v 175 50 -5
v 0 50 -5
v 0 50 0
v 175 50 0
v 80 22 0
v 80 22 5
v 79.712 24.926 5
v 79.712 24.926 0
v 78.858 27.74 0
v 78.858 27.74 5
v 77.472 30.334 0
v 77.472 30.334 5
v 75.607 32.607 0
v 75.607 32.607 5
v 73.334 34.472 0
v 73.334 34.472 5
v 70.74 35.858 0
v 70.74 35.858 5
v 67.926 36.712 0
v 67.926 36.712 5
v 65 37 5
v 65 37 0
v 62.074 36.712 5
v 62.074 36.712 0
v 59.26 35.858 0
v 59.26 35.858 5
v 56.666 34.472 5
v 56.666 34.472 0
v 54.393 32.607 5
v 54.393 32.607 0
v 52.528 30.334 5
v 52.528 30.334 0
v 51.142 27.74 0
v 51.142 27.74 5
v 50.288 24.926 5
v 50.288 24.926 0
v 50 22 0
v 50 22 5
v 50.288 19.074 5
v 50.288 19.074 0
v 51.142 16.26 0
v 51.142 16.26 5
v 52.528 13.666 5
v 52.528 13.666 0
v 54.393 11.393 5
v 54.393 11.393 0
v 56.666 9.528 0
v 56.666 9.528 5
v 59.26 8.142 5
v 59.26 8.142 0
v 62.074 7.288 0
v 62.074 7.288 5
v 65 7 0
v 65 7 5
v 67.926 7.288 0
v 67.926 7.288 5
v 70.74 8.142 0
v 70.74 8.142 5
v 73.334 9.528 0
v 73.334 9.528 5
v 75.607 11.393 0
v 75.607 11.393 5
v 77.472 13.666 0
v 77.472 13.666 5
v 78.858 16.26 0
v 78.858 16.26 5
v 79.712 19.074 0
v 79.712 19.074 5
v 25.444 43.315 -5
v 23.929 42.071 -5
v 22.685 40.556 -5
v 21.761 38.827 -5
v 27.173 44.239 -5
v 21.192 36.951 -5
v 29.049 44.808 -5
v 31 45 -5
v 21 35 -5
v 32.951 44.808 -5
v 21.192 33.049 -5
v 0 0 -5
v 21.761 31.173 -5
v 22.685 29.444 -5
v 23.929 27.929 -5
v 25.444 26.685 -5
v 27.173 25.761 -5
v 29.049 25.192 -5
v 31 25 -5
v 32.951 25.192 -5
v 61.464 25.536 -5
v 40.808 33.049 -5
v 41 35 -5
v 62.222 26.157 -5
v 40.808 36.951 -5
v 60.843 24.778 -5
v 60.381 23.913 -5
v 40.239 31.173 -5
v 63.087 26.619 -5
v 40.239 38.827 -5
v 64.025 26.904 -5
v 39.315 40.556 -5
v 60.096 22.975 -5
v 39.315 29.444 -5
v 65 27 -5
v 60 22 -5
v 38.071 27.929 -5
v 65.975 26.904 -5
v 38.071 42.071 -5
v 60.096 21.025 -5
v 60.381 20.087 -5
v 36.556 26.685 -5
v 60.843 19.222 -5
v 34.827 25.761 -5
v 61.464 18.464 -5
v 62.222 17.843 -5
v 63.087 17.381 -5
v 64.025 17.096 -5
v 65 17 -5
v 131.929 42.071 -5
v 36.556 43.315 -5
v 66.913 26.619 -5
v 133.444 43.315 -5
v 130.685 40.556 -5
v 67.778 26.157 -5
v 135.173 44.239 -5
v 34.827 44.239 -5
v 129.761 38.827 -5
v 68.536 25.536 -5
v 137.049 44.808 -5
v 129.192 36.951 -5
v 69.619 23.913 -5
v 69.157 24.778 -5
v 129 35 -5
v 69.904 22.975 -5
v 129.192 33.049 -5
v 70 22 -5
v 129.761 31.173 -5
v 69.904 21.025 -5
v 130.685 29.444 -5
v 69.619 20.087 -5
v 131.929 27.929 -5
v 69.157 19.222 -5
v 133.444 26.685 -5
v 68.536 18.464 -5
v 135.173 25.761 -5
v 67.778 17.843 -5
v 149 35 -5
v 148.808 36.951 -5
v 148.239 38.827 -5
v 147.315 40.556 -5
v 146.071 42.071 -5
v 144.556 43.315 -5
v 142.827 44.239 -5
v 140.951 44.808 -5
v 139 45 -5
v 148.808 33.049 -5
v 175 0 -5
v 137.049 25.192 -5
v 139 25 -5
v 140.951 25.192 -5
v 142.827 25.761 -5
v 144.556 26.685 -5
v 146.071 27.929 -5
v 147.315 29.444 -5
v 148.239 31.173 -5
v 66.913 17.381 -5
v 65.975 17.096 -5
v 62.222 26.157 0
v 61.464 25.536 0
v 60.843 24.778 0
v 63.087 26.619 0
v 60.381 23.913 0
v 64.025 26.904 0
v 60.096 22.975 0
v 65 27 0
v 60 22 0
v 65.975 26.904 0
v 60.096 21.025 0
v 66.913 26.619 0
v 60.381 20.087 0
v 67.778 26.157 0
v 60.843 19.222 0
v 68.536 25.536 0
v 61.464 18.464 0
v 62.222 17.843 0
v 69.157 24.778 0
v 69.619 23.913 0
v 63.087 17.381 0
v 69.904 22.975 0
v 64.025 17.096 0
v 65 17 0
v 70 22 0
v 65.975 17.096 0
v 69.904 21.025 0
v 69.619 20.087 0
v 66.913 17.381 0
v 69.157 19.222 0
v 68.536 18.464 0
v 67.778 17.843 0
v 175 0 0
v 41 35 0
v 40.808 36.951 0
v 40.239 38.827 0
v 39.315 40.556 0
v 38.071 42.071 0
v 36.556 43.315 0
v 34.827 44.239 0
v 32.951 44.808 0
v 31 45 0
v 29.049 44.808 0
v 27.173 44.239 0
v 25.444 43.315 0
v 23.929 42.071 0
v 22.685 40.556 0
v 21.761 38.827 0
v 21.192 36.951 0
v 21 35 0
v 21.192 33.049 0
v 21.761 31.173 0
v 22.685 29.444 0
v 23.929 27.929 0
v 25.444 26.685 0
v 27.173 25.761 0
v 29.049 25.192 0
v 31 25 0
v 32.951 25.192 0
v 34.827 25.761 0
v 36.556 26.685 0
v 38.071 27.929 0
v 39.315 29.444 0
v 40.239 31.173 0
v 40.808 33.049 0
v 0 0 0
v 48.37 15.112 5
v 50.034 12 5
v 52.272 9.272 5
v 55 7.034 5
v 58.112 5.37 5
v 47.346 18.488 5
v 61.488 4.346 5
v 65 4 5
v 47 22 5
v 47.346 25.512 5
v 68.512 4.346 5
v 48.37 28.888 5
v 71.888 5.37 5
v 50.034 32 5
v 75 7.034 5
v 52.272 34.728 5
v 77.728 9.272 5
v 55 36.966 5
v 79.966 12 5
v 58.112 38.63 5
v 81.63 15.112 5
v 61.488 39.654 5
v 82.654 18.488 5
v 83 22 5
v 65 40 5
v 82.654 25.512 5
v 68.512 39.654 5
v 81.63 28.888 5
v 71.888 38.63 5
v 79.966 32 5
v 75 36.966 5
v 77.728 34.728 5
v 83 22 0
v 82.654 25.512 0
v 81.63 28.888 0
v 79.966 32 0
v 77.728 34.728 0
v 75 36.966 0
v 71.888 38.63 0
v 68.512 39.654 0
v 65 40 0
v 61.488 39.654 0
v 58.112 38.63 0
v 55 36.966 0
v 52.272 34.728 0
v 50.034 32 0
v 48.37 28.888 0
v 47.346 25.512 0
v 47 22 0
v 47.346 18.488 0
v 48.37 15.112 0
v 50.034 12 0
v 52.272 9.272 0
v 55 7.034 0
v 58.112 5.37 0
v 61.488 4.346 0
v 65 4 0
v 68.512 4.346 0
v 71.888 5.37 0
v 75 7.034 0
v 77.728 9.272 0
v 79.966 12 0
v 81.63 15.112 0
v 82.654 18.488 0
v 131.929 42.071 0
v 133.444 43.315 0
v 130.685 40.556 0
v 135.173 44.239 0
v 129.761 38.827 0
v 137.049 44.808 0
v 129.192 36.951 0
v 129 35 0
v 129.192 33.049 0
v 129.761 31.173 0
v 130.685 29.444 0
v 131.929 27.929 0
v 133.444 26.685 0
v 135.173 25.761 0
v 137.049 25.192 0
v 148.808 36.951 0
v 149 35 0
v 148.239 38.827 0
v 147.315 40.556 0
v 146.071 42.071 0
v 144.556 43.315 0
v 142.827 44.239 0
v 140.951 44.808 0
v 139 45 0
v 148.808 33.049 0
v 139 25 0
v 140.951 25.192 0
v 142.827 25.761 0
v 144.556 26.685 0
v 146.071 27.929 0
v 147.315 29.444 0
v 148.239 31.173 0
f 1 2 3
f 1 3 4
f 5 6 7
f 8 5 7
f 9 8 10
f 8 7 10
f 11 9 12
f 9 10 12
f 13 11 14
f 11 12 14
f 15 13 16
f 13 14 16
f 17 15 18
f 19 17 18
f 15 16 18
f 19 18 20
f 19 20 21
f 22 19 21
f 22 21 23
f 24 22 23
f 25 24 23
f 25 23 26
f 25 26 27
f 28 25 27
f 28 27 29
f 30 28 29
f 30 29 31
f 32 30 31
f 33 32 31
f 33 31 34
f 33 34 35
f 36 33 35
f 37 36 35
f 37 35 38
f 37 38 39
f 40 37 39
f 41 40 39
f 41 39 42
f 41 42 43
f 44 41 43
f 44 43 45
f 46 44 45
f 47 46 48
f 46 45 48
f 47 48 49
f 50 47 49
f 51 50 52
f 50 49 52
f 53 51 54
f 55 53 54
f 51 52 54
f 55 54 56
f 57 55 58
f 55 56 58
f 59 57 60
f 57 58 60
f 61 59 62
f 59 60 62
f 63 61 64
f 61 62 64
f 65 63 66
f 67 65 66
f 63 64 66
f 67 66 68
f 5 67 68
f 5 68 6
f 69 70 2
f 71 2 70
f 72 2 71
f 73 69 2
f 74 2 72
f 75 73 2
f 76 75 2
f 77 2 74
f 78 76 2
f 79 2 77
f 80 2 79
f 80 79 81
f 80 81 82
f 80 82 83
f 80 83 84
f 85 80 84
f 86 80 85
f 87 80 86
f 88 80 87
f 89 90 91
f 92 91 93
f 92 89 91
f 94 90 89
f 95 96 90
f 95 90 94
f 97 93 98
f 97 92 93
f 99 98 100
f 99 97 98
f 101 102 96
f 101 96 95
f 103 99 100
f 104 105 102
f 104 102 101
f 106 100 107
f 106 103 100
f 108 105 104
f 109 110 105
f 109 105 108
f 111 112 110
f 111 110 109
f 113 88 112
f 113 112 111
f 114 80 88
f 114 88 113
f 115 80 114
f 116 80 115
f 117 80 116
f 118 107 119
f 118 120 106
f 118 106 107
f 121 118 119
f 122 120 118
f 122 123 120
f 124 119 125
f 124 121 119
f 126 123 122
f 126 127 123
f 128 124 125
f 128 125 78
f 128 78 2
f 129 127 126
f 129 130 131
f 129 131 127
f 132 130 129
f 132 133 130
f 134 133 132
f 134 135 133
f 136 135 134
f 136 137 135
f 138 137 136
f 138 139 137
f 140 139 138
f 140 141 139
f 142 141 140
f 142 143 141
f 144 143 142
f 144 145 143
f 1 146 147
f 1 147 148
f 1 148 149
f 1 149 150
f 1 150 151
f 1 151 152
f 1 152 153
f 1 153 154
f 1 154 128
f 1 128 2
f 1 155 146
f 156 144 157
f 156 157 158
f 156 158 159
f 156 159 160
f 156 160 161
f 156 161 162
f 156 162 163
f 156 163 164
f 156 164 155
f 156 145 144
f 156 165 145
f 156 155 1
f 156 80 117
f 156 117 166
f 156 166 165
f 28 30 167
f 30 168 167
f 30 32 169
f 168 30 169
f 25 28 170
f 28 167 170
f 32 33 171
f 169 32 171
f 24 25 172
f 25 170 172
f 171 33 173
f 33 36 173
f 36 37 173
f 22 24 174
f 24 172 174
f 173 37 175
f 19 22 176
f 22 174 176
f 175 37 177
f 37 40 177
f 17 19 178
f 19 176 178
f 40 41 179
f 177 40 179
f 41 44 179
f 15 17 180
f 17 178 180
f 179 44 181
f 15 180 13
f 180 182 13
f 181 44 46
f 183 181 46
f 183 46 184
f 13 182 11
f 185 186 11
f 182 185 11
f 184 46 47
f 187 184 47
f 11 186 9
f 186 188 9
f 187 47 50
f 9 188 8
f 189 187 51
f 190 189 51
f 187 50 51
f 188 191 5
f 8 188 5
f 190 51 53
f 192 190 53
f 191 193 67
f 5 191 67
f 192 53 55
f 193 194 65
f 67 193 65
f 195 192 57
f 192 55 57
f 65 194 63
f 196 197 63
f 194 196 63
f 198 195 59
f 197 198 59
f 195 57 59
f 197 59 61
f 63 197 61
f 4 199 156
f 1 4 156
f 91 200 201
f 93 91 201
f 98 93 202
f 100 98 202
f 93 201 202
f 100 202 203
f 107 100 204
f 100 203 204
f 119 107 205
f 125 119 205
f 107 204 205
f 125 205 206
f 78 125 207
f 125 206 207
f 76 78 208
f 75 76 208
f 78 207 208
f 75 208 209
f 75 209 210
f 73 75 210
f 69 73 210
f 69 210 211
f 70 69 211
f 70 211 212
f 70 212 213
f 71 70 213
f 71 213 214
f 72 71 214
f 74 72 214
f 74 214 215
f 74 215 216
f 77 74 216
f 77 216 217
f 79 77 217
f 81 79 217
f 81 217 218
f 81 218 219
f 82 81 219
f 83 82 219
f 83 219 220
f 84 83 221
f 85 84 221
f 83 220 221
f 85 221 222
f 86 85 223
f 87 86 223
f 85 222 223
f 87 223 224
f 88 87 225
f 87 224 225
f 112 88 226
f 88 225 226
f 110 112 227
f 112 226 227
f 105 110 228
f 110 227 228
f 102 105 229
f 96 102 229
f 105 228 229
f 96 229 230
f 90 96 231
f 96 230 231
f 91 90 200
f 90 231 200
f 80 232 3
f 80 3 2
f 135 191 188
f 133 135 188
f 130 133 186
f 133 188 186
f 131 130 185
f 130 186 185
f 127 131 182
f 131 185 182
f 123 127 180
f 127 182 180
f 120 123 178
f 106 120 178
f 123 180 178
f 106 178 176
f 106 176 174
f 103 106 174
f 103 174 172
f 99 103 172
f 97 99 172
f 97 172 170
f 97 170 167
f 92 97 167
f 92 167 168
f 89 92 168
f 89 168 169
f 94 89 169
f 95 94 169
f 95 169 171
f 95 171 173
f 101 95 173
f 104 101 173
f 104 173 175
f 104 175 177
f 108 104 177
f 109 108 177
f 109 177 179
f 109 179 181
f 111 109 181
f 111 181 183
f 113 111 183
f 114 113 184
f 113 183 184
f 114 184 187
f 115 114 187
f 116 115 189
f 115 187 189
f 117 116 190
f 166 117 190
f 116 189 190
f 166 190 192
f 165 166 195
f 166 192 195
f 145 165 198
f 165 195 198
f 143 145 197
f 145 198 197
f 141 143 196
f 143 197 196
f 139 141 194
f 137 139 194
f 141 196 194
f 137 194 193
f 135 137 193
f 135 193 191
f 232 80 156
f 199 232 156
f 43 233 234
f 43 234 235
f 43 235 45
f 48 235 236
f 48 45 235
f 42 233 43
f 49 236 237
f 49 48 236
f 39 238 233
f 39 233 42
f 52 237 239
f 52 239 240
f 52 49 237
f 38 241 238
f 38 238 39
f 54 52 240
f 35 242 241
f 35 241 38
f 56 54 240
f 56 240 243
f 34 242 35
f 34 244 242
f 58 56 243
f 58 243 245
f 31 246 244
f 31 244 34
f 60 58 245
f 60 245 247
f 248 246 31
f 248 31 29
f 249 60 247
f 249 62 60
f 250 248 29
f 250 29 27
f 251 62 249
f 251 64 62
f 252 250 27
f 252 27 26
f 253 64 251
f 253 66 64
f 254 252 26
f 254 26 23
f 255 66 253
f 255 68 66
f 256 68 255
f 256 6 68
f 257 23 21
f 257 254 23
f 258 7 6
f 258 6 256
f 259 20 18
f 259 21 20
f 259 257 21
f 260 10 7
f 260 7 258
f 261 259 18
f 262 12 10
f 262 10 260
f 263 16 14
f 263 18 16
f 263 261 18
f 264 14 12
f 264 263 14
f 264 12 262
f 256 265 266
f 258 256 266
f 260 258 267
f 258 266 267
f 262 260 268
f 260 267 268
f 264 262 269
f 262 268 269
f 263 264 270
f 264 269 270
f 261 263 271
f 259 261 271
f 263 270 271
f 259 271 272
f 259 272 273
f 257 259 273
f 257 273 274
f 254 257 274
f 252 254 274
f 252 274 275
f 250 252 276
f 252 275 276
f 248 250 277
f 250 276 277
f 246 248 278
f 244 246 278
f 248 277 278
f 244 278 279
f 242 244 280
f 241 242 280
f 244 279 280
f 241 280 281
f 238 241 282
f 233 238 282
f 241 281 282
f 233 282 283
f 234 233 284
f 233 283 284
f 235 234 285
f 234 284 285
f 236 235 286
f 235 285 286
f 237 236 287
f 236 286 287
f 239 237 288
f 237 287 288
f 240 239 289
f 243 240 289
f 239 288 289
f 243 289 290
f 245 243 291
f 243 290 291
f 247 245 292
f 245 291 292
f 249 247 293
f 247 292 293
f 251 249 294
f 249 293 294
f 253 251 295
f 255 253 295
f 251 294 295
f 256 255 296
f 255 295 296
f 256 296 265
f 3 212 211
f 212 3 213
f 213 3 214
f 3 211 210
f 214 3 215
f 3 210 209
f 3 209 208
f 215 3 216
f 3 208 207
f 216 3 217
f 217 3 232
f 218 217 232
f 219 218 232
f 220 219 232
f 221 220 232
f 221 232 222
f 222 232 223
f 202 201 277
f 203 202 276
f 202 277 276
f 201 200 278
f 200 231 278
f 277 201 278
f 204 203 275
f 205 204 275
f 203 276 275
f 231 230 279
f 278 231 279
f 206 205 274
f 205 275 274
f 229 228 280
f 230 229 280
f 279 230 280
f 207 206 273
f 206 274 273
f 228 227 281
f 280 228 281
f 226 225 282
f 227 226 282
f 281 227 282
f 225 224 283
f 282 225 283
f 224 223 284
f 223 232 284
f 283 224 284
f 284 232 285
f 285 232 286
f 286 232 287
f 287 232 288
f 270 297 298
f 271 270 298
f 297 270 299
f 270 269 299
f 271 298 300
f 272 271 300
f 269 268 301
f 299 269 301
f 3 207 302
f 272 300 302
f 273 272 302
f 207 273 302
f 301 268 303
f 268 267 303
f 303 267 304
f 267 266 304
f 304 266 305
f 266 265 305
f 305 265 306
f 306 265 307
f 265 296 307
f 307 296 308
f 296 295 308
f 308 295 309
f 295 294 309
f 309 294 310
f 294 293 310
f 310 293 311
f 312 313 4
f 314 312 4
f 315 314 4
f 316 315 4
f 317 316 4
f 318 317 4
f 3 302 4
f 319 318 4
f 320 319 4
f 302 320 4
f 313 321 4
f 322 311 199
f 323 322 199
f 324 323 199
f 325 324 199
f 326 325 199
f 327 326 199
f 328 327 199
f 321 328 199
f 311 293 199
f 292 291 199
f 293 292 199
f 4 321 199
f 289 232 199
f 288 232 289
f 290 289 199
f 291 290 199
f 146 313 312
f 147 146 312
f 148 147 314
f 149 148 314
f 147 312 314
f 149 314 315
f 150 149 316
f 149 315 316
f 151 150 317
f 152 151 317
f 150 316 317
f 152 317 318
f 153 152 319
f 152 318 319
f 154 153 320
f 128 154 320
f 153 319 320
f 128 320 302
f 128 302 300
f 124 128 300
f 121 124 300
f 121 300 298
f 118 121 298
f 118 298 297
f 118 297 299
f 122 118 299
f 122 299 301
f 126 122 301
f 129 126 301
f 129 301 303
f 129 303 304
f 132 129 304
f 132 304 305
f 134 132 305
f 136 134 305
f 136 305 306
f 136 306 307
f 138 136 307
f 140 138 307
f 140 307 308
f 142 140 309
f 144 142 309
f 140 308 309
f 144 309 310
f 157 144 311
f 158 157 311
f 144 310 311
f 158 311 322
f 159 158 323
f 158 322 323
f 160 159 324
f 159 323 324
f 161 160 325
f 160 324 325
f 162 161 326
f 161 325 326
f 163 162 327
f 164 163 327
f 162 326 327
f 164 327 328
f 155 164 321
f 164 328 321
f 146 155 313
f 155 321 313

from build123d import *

# Parameters (mm, degrees)
BOX_W             = 175
BOX_H             = 5
BOX_DEPTH         = 50
SKETCH_R          = 10
POCKET_DEPTH      = 5.001
SKETCH003_R       = 5
POCKET002_DEPTH   = 5.001
SKETCH001_R       = 18
PAD_DEPTH         = 5
SKETCH002_R       = 15
POCKET001_DEPTH   = 5.001
FUSION_ROLL_ANGLE = -90


with BuildPart() as pocket002:
    # Box → Box (new body)
    with BuildSketch(Plane.XY):
        with Locations((87.5, 2.5)):
            Rectangle(BOX_W, BOX_H)
    extrude(amount=BOX_DEPTH)

    # Sketch → Pocket (cut, through all)
    with BuildSketch(Plane.XZ):
        with Locations((31, 35)):
            Circle(SKETCH_R)
        with Locations((139, 35)):
            Circle(SKETCH_R)
    extrude(amount=-POCKET_DEPTH, mode=Mode.SUBTRACT)

    # Sketch003 → Pocket002 (cut, through all)
    with BuildSketch(Plane.XZ):
        with Locations((65, 22)):
            Circle(SKETCH003_R)
    extrude(amount=-POCKET002_DEPTH, mode=Mode.SUBTRACT)


with BuildPart() as fusion:
    # Sketch001 → Pad (new body)
    with BuildSketch(Plane.XZ):
        with Locations((65, 22)):
            Circle(SKETCH001_R)
    extrude(amount=PAD_DEPTH)

    # Sketch002 → Pocket001 (cut, through all)
    with BuildSketch(Plane.XZ.offset(5)):
        with Locations((65, 22)):
            Circle(SKETCH002_R)
    extrude(amount=-POCKET001_DEPTH, mode=Mode.SUBTRACT)

    # Fusion: union Pocket002
    add(pocket002.part)


with BuildPart() as fusion_1:
    # Fusion roll: moved
    add(fusion.part.rotate(Axis((0, 0, 0), (1, 0, 0)), FUSION_ROLL_ANGLE))


with BuildPart() as fusion_2:
    # Fusion placement: moved
    add(fusion_1.part)


solid = fusion_2.part
